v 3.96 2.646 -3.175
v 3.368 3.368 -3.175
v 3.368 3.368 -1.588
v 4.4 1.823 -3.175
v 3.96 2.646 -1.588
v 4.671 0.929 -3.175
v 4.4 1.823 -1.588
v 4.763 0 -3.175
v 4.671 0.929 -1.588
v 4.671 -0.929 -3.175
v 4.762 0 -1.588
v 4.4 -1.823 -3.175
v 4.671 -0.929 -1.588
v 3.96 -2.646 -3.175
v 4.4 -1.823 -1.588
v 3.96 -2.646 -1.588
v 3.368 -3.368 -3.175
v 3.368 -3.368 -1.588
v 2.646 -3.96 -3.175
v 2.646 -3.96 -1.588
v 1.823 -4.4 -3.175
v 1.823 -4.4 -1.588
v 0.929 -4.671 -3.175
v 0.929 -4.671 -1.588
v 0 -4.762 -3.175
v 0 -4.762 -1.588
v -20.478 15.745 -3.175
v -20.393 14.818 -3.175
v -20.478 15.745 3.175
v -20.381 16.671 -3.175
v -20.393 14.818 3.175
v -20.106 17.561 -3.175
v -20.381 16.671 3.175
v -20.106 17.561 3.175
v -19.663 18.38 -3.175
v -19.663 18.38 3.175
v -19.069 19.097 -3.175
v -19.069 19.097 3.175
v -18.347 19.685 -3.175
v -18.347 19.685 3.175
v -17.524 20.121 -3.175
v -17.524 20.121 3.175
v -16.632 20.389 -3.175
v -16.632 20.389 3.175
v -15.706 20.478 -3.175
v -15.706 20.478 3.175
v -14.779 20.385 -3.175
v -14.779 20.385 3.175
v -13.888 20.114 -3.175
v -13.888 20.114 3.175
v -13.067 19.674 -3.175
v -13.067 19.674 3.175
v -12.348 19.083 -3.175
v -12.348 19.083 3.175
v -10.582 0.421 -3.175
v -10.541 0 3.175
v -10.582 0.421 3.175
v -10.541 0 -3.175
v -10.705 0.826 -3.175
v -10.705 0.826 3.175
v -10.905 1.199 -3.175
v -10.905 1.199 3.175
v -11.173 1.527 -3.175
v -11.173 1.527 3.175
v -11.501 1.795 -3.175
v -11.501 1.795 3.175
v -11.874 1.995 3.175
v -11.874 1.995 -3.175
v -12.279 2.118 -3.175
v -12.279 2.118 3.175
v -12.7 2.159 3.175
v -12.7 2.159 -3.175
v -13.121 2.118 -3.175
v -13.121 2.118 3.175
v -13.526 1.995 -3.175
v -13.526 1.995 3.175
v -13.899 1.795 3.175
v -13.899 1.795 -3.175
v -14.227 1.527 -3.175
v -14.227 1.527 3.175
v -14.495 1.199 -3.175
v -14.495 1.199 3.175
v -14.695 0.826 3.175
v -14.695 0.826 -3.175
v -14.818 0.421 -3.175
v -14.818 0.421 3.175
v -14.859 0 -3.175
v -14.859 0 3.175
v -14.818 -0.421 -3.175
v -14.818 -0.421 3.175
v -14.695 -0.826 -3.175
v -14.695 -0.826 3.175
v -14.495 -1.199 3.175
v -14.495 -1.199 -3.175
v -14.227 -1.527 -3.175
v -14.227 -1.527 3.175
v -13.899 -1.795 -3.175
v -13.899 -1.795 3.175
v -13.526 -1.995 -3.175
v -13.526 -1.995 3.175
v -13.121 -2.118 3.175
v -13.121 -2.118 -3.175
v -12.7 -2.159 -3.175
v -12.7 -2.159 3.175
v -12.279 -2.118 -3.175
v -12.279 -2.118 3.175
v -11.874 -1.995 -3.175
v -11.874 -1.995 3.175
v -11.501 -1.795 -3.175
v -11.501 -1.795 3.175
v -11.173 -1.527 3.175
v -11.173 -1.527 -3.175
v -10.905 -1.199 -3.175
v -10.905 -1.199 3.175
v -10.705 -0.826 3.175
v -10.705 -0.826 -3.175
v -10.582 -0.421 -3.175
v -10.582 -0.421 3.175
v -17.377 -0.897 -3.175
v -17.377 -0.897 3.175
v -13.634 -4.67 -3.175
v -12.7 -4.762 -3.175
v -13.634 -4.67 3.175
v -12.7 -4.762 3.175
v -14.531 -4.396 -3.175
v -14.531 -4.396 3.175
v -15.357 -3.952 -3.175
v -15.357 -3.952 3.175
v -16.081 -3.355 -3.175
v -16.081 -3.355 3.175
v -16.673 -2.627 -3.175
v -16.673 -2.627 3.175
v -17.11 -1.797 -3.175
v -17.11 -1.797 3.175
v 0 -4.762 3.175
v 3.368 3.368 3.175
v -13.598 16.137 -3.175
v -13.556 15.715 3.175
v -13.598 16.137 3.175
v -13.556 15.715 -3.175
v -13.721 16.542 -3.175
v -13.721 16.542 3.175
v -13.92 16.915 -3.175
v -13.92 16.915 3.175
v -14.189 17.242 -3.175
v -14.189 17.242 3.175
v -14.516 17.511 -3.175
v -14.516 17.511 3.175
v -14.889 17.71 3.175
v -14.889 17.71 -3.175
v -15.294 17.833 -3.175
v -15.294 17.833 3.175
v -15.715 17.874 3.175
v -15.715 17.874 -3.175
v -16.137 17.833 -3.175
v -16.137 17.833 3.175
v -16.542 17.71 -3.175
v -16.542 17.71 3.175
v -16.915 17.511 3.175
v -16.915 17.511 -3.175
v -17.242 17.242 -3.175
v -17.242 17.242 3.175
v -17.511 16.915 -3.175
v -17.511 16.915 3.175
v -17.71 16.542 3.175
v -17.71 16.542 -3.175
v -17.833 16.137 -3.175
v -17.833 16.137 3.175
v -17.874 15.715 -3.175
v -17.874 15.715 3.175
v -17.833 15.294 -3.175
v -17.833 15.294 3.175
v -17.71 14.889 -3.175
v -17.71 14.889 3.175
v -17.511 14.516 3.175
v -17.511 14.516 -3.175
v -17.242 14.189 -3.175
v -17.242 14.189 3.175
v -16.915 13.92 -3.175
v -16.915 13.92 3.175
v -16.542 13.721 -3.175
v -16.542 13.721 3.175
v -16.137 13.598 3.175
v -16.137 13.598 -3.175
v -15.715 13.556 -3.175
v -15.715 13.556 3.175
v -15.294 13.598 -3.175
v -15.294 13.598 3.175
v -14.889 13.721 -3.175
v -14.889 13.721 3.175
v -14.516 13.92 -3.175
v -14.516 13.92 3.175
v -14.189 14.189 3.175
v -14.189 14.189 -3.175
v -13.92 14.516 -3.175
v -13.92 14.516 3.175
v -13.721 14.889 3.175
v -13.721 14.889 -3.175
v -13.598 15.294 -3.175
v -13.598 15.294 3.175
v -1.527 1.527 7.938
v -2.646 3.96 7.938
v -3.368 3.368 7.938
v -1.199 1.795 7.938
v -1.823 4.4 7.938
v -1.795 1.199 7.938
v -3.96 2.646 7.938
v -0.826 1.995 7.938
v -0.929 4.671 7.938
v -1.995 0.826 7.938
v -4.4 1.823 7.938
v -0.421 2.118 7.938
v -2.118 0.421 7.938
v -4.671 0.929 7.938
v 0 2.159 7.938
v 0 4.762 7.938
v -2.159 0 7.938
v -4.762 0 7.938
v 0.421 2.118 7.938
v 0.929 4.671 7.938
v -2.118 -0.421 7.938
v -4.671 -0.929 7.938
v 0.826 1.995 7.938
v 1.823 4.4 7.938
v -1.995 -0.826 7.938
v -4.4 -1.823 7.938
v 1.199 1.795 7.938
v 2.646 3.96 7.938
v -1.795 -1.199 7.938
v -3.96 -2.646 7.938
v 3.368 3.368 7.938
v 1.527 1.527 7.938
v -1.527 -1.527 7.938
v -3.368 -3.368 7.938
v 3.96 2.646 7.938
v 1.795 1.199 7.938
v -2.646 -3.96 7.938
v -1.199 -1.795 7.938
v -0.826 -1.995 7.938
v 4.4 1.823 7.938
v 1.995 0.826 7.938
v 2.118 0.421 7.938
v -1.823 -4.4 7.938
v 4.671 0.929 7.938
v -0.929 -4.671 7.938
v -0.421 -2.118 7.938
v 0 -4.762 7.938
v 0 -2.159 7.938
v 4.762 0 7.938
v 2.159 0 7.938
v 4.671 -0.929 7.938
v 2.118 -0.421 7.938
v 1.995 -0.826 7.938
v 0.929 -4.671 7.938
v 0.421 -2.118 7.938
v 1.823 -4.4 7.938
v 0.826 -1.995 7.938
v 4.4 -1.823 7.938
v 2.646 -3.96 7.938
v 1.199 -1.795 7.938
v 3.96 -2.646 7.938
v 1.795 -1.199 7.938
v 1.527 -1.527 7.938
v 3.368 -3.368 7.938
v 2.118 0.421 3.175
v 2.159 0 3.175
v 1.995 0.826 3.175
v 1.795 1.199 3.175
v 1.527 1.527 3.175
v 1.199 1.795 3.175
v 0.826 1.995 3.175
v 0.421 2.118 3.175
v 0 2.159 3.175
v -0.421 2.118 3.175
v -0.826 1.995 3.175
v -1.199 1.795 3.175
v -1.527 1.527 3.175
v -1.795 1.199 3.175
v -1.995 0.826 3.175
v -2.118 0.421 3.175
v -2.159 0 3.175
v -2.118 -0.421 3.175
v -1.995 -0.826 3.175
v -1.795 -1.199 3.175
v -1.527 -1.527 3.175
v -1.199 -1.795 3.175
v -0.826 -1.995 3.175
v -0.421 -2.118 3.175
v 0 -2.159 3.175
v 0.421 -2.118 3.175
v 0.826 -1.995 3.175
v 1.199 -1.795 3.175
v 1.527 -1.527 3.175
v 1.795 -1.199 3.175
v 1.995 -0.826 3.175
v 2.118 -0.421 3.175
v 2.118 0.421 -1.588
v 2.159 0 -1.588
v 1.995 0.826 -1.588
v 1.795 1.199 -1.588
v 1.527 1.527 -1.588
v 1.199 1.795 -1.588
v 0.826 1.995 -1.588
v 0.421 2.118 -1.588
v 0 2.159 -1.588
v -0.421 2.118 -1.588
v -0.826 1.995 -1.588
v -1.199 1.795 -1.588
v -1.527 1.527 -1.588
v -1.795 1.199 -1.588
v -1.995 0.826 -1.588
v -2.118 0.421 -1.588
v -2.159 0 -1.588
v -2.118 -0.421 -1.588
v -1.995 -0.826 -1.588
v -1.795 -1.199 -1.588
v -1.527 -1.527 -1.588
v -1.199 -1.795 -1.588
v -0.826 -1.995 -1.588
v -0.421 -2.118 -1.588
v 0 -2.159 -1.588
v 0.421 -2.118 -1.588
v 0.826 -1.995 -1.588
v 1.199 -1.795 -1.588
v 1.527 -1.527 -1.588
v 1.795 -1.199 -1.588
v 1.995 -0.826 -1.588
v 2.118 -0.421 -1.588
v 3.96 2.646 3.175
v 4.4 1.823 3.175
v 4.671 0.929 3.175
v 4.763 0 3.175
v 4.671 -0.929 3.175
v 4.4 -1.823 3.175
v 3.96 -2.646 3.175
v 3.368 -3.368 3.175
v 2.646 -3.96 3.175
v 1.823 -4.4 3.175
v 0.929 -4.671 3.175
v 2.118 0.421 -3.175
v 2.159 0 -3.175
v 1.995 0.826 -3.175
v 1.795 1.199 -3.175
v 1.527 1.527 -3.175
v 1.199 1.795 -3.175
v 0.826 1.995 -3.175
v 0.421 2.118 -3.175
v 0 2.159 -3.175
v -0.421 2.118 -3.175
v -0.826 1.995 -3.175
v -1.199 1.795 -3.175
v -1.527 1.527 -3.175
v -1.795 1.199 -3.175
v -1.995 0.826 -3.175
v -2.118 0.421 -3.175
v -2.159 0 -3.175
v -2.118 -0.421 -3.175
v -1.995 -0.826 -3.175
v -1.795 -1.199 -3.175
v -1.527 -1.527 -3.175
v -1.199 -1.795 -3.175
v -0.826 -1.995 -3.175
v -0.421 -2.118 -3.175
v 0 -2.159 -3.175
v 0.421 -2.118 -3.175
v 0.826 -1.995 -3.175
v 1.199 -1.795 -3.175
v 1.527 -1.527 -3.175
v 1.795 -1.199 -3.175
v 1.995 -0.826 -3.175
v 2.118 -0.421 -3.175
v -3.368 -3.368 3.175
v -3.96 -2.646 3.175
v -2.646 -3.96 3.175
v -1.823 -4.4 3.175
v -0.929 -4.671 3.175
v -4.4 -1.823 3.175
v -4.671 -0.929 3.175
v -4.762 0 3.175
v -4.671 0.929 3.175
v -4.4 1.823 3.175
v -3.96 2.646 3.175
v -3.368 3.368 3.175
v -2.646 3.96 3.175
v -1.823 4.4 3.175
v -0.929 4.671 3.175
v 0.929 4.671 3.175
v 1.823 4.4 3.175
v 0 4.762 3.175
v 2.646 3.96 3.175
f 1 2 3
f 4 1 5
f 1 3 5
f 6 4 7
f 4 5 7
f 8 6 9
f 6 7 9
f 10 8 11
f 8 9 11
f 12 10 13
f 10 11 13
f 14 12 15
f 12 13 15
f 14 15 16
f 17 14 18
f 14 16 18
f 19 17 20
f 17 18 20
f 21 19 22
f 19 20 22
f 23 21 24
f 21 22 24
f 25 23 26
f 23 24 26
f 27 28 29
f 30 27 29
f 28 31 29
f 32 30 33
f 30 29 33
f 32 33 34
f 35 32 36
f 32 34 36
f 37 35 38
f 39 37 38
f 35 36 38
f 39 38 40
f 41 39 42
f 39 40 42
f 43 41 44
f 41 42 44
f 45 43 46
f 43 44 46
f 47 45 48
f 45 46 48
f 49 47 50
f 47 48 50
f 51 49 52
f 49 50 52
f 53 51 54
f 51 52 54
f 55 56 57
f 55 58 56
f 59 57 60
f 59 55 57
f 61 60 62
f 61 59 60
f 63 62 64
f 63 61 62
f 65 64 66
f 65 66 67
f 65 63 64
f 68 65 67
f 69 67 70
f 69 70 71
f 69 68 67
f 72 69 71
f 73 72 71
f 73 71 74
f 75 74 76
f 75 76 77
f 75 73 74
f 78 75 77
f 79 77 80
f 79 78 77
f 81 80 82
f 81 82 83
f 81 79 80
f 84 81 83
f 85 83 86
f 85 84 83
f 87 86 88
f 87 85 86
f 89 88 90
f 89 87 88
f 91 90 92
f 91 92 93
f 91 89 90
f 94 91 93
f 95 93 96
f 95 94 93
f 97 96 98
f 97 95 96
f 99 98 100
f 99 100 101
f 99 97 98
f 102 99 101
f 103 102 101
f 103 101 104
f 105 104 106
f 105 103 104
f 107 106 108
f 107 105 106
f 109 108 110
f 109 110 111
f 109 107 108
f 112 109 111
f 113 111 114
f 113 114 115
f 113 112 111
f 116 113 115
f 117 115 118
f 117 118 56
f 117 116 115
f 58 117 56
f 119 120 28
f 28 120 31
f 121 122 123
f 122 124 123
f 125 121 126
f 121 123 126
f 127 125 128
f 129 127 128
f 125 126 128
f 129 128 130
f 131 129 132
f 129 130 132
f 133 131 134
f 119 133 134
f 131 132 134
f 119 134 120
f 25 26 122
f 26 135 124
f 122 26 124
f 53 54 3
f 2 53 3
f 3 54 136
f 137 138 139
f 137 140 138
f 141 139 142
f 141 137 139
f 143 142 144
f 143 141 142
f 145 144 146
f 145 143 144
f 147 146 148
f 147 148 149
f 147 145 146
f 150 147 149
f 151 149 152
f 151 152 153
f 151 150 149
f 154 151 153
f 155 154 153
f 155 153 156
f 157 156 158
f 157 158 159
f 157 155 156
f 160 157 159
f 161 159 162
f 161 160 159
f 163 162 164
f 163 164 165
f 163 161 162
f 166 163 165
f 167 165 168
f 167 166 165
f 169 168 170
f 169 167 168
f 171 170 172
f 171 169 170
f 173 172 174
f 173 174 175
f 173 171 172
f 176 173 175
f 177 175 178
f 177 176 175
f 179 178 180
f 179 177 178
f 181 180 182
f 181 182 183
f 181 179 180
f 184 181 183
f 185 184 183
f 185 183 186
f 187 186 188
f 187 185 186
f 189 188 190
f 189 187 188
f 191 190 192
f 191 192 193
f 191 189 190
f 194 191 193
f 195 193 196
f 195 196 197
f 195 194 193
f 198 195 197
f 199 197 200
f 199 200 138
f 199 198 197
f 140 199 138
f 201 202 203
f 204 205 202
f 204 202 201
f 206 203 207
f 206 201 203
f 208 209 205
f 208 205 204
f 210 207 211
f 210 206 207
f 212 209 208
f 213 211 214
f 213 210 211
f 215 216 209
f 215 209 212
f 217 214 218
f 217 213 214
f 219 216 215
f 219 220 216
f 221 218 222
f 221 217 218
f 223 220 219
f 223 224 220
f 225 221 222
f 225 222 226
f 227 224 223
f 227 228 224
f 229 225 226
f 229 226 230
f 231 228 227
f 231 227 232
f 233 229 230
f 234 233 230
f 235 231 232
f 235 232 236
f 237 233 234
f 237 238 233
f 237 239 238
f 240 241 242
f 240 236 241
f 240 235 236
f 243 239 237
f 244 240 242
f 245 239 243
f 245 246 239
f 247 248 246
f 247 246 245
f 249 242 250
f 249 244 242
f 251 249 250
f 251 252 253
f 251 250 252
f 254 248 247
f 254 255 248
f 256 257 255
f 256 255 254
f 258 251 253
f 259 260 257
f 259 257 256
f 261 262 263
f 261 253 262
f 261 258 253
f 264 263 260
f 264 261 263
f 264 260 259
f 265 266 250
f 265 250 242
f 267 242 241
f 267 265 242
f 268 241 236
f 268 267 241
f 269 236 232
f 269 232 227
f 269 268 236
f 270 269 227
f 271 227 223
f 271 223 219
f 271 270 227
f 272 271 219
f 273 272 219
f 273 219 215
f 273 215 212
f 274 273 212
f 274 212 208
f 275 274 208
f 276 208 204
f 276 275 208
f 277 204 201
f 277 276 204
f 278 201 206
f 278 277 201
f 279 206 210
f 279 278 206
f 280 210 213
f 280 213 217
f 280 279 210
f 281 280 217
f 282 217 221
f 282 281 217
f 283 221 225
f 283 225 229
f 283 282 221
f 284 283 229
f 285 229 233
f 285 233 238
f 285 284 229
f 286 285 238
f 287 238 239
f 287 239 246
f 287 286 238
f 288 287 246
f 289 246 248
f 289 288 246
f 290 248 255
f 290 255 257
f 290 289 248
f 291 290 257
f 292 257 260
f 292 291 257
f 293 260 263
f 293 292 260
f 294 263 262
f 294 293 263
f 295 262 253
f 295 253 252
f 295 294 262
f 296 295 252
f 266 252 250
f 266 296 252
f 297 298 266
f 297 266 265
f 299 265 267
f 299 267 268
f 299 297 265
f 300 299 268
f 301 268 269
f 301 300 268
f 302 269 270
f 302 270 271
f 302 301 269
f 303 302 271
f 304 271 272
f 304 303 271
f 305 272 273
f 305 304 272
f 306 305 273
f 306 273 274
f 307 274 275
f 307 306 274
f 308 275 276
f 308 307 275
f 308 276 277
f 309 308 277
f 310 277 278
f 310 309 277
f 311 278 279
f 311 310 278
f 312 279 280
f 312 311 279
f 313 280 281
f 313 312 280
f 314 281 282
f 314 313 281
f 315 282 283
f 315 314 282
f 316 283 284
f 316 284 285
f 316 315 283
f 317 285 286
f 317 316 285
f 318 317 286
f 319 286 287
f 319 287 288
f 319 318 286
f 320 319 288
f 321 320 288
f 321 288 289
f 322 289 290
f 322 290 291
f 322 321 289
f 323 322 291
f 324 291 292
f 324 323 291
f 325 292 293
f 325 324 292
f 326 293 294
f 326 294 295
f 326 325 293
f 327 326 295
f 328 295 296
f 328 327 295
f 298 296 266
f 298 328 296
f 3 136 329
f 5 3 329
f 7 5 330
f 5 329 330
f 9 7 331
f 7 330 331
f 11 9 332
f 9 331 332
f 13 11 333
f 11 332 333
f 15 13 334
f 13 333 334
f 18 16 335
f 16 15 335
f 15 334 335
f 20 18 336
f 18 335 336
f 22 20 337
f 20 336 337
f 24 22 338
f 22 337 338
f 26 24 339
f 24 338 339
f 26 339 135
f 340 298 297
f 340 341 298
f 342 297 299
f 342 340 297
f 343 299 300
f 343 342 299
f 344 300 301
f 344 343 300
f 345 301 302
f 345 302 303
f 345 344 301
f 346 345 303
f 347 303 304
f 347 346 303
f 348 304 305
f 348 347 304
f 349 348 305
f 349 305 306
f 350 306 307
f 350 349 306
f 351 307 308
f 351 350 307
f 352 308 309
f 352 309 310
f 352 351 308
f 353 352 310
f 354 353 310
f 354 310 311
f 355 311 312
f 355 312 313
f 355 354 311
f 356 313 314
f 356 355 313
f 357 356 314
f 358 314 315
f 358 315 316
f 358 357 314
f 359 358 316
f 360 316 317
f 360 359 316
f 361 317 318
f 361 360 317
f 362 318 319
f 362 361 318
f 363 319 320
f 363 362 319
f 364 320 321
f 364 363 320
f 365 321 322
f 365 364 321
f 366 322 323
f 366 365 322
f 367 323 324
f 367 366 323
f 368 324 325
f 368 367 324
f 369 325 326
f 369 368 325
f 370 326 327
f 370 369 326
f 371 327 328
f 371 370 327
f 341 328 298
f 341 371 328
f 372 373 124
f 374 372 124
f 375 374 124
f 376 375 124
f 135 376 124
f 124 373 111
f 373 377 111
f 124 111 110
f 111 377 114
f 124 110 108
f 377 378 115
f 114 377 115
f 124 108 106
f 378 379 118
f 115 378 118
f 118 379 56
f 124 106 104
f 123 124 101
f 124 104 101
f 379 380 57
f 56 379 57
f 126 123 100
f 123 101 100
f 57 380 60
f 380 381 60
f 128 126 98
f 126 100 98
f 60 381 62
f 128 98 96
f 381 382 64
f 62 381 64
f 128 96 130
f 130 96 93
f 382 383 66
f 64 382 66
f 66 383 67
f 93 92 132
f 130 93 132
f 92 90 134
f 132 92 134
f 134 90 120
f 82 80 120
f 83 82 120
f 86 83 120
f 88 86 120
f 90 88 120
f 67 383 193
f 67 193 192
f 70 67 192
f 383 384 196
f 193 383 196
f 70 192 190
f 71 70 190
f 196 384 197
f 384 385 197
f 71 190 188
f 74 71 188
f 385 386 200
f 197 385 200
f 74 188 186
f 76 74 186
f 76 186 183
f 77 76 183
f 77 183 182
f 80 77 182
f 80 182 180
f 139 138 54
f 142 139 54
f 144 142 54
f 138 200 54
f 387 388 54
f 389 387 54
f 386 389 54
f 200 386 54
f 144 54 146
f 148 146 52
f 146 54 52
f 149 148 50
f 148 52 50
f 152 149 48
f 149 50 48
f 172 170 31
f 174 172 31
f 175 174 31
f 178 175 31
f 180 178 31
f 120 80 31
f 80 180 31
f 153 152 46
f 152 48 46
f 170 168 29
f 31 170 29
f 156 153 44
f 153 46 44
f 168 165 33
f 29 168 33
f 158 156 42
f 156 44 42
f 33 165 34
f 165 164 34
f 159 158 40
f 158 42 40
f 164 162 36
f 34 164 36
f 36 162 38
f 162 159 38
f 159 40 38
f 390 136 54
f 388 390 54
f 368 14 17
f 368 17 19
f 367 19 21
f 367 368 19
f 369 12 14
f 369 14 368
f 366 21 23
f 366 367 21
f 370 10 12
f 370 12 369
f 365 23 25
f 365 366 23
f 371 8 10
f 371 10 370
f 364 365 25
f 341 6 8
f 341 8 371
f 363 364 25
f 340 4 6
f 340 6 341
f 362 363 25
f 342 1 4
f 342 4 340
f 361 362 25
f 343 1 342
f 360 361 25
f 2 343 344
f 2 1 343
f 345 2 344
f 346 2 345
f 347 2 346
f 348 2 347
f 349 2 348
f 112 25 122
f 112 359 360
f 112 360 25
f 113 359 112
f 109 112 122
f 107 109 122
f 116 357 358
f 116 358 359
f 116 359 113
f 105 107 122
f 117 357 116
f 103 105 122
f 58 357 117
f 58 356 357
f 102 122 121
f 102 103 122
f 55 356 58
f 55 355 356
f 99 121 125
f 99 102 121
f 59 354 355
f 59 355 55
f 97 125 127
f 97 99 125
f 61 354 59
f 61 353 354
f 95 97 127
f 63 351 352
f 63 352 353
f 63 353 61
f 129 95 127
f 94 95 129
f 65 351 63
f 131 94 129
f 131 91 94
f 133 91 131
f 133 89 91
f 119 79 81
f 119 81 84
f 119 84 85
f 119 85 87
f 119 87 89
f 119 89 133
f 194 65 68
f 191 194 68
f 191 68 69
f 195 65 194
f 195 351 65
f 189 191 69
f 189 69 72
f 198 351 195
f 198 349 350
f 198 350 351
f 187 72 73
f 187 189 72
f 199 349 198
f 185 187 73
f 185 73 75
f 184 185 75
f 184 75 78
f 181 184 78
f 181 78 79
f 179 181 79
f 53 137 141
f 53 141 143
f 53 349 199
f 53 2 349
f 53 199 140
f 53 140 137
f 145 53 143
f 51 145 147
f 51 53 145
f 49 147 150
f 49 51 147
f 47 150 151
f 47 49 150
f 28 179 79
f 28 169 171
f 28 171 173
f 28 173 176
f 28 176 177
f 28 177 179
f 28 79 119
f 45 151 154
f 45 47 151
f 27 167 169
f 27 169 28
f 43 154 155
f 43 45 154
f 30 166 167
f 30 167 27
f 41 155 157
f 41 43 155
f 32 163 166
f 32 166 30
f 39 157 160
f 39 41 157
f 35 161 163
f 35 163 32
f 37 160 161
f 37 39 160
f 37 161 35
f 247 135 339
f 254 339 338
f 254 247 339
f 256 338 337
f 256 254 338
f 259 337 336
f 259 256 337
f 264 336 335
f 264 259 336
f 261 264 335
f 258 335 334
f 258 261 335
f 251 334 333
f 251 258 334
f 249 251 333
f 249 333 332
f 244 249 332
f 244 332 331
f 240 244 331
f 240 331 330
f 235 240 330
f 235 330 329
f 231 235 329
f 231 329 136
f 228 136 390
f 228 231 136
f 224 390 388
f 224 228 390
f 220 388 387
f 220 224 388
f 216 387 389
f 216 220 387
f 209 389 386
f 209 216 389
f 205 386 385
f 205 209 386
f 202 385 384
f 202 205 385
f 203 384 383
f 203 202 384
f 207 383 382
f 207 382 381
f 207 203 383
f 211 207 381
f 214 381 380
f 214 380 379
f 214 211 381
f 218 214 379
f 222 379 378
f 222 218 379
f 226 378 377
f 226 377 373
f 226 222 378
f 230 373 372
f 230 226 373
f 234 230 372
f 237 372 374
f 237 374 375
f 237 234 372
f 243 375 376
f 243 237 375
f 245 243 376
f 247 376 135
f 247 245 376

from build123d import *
from build123d.topology import SkipClean

# Parameters (mm, degrees)
SKETCH1_R           = 2.159
BOSS_EXTRUDE1_DEPTH = 3.175
SKETCH3_R           = 4.7625
SKETCH3_R_2         = 2.159
BOSS_EXTRUDE2_DEPTH = 4.7625


with BuildPart() as part:
    # Sketch1 → Boss-Extrude1 (new, symmetric)
    with BuildSketch(Plane.XY):
        with BuildLine():
            Line((0, -4.7625), (-12.7, -4.7625))
            ThreePointArc((-12.7, -4.7625), (-15.733752874, -3.67120549), (-17.377178039, -0.897447401))
            Line((-17.377178039, -0.897447401), (-20.392626251, 14.818000811))
            ThreePointArc((-20.392626251, 14.818000811), (-17.946232861, 19.923179917), (-12.347852166, 19.083044257))
            Line((-12.347852166, 19.083044257), (3.367596045, 3.367596045))
            ThreePointArc((3.367596045, 3.367596045), (4.399976274, -1.822529847), (0, -4.7625))
        make_face()
        with Locations((-12.7, 0)):
            Circle(SKETCH1_R, mode=Mode.SUBTRACT)
        with Locations((-15.715448212, 15.715448212)):
            Circle(SKETCH1_R, mode=Mode.SUBTRACT)
        Circle(SKETCH1_R, mode=Mode.SUBTRACT)
    extrude(amount=BOSS_EXTRUDE1_DEPTH, both=True)

    # Sketch3 → Boss-Extrude2 (add, symmetric)
    with SkipClean():  # the faces are left unmerged after this step: merging them gives an invalid solid
        with BuildSketch(Plane.XY.offset(3.175)):
            with Locations(Location((0, 0, 0), (0, 0, 270))):
                Circle(SKETCH3_R)
            Circle(SKETCH3_R_2, mode=Mode.SUBTRACT)
        extrude(amount=BOSS_EXTRUDE2_DEPTH, both=True)


solid = part.part
